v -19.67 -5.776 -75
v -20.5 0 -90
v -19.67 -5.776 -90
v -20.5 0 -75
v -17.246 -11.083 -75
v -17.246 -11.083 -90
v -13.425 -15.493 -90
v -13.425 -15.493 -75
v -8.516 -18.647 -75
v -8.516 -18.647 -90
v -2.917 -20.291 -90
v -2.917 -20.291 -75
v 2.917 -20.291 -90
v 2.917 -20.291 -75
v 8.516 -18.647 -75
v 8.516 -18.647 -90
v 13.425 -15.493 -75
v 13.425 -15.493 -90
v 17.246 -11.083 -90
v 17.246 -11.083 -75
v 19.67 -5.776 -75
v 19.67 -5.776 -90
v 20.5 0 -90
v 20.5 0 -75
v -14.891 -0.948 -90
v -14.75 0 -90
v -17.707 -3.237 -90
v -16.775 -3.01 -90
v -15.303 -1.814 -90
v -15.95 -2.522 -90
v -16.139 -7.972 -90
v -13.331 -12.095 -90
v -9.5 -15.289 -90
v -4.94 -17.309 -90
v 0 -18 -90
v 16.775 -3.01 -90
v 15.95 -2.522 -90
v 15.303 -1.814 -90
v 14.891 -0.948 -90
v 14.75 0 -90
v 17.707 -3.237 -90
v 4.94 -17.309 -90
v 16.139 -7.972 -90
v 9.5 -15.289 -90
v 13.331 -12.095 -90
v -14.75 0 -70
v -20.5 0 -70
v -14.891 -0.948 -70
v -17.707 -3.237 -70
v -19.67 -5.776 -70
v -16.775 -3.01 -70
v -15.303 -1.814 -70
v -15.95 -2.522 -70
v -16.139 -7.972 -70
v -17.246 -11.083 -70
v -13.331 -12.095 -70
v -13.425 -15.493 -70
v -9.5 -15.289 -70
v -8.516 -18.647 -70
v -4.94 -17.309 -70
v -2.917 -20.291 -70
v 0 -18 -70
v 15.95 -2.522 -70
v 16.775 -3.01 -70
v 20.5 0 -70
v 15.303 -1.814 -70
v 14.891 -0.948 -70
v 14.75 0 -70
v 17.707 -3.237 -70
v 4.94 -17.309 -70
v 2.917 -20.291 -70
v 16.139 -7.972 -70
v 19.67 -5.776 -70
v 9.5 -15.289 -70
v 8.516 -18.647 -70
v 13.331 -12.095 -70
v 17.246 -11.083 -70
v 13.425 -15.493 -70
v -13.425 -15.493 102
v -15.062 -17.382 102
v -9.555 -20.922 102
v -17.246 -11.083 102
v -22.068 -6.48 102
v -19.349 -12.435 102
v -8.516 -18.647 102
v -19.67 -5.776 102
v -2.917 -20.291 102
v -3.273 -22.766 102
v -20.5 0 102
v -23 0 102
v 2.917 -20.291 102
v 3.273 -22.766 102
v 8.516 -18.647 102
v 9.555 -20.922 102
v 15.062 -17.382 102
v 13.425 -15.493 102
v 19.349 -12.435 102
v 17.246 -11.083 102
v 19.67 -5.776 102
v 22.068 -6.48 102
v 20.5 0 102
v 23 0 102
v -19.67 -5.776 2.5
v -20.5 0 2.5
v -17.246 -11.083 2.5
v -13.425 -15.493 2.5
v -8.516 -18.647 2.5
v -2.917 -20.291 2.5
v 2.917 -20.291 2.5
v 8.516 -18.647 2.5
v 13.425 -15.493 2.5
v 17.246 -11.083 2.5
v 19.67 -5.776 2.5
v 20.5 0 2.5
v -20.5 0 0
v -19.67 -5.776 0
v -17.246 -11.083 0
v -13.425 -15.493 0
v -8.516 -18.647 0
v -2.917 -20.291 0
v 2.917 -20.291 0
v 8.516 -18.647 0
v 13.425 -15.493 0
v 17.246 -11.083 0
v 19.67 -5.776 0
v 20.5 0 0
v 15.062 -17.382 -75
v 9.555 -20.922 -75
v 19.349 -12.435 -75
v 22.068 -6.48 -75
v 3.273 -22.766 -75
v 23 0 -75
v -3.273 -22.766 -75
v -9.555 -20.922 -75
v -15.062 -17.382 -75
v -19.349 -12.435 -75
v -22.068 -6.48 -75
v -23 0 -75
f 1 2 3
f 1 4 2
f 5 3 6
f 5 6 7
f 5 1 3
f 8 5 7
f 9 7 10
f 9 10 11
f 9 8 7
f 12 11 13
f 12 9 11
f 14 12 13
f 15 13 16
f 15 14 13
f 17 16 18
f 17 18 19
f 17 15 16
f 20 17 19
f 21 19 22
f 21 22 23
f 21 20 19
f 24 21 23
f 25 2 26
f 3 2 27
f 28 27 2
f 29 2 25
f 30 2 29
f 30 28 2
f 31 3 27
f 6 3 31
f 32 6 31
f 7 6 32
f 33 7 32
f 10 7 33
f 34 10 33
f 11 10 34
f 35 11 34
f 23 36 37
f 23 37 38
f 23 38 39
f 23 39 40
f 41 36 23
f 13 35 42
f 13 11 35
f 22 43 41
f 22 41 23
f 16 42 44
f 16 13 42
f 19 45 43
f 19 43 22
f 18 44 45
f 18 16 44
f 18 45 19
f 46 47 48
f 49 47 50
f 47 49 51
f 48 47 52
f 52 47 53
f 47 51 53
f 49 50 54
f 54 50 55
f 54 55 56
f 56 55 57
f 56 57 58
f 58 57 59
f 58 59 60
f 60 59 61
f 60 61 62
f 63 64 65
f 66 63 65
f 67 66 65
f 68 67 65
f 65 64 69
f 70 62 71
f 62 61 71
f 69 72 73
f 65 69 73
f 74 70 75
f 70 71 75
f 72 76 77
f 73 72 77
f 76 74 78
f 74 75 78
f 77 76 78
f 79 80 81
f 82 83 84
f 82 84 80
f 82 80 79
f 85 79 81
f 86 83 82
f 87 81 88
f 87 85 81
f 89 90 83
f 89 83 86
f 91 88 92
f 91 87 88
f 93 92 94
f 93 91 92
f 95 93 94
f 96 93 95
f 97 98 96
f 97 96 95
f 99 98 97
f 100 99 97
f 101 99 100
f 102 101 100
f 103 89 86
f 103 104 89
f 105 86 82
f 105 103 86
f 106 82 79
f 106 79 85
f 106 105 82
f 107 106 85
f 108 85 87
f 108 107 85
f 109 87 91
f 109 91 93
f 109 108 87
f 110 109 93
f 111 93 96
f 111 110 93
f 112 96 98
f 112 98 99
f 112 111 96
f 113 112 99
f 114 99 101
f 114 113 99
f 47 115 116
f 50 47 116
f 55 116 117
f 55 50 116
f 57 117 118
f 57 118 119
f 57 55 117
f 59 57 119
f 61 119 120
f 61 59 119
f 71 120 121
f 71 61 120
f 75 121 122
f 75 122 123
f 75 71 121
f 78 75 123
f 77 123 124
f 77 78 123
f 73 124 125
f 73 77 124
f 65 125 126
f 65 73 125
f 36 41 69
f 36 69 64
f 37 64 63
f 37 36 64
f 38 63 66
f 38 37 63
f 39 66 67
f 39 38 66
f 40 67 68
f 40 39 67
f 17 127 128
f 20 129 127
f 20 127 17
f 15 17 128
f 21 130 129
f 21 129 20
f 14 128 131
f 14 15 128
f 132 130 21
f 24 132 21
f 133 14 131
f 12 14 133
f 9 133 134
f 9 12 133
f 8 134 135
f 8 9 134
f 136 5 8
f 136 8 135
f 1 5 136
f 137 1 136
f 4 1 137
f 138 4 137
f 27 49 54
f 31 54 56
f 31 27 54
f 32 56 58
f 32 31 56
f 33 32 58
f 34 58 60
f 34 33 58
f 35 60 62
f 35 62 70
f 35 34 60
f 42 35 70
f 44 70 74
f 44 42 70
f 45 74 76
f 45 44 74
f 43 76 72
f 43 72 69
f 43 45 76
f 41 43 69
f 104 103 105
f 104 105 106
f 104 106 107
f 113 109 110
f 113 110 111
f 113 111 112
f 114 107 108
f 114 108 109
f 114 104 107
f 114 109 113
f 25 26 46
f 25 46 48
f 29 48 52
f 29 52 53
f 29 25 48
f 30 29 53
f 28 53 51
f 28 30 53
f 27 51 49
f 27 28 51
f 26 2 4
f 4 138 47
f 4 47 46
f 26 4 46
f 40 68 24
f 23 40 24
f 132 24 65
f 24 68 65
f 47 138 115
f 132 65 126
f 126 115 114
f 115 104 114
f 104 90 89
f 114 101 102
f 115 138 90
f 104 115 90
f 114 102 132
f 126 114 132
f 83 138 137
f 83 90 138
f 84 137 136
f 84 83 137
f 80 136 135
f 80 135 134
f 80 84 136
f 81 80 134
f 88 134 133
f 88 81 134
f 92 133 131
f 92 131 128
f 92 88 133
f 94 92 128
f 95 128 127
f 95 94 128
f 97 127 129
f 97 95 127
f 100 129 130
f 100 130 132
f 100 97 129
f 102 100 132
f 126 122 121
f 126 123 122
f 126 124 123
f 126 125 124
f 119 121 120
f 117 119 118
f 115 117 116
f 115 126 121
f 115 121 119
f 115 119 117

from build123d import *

# Parameters (mm, degrees)
F3_DEPTH = 2.5
F5_DEPTH = 20
F7_DEPTH = 192.001


with BuildPart() as f1:
    # F0 (on Front) → F1 (revolve)
    with BuildSketch(Plane.XZ):
        Polygon((20.5, 2.5), (0, 2.5), (0, 0), (20.5, 0), (20.5, -70), (18, -70), (18, -90), (20.5, -90), (20.5, -75), (23, -75), (23, 0), (23, 102), (20.5, 102), align=None)
    revolve(axis=Axis((0, 0, 1.25), (0, 0, 1)))

    # F2 (on face) → F3 (cut, through all)
    with BuildSketch(Plane.XY.offset(2.5)):
        with BuildLine():
            Line((0, 12.5), (16.248077, 12.5))
            ThreePointArc((16.248077, 12.5), (9.055385, 18.391574), (0, 20.5))
            Line((0, 20.5), (0, 12.5))
        make_face()
    extrude(amount=-F3_DEPTH, mode=Mode.SUBTRACT)

    # F4 (on face) → F5 (join, through all)
    with BuildSketch(Plane(origin=(0, 0, -90), x_dir=(1, 0, 0), z_dir=(0, 0, -1))):
        with BuildLine():
            ThreePointArc((-17.706597, 3.236729), (-18, 0), (-17.706597, -3.236729))
            ThreePointArc((-17.706597, -3.236729), (-14.75, 0), (-17.706597, 3.236729))
        make_face()
        with BuildLine():
            ThreePointArc((17.706597, -3.236729), (18, 0), (17.706597, 3.236729))
            ThreePointArc((17.706597, 3.236729), (14.75, 0), (17.706597, -3.236729))
        make_face()
    extrude(amount=-F5_DEPTH)

    # F6 (on face) → F7 (cut, through all)
    with BuildSketch(Plane.XY.offset(102)):
        with BuildLine():
            Line((-23, 0), (23, 0))
            ThreePointArc((23, 0), (0, 23), (-23, 0))
        make_face()
    extrude(amount=-F7_DEPTH, mode=Mode.SUBTRACT)


solid = f1.part
